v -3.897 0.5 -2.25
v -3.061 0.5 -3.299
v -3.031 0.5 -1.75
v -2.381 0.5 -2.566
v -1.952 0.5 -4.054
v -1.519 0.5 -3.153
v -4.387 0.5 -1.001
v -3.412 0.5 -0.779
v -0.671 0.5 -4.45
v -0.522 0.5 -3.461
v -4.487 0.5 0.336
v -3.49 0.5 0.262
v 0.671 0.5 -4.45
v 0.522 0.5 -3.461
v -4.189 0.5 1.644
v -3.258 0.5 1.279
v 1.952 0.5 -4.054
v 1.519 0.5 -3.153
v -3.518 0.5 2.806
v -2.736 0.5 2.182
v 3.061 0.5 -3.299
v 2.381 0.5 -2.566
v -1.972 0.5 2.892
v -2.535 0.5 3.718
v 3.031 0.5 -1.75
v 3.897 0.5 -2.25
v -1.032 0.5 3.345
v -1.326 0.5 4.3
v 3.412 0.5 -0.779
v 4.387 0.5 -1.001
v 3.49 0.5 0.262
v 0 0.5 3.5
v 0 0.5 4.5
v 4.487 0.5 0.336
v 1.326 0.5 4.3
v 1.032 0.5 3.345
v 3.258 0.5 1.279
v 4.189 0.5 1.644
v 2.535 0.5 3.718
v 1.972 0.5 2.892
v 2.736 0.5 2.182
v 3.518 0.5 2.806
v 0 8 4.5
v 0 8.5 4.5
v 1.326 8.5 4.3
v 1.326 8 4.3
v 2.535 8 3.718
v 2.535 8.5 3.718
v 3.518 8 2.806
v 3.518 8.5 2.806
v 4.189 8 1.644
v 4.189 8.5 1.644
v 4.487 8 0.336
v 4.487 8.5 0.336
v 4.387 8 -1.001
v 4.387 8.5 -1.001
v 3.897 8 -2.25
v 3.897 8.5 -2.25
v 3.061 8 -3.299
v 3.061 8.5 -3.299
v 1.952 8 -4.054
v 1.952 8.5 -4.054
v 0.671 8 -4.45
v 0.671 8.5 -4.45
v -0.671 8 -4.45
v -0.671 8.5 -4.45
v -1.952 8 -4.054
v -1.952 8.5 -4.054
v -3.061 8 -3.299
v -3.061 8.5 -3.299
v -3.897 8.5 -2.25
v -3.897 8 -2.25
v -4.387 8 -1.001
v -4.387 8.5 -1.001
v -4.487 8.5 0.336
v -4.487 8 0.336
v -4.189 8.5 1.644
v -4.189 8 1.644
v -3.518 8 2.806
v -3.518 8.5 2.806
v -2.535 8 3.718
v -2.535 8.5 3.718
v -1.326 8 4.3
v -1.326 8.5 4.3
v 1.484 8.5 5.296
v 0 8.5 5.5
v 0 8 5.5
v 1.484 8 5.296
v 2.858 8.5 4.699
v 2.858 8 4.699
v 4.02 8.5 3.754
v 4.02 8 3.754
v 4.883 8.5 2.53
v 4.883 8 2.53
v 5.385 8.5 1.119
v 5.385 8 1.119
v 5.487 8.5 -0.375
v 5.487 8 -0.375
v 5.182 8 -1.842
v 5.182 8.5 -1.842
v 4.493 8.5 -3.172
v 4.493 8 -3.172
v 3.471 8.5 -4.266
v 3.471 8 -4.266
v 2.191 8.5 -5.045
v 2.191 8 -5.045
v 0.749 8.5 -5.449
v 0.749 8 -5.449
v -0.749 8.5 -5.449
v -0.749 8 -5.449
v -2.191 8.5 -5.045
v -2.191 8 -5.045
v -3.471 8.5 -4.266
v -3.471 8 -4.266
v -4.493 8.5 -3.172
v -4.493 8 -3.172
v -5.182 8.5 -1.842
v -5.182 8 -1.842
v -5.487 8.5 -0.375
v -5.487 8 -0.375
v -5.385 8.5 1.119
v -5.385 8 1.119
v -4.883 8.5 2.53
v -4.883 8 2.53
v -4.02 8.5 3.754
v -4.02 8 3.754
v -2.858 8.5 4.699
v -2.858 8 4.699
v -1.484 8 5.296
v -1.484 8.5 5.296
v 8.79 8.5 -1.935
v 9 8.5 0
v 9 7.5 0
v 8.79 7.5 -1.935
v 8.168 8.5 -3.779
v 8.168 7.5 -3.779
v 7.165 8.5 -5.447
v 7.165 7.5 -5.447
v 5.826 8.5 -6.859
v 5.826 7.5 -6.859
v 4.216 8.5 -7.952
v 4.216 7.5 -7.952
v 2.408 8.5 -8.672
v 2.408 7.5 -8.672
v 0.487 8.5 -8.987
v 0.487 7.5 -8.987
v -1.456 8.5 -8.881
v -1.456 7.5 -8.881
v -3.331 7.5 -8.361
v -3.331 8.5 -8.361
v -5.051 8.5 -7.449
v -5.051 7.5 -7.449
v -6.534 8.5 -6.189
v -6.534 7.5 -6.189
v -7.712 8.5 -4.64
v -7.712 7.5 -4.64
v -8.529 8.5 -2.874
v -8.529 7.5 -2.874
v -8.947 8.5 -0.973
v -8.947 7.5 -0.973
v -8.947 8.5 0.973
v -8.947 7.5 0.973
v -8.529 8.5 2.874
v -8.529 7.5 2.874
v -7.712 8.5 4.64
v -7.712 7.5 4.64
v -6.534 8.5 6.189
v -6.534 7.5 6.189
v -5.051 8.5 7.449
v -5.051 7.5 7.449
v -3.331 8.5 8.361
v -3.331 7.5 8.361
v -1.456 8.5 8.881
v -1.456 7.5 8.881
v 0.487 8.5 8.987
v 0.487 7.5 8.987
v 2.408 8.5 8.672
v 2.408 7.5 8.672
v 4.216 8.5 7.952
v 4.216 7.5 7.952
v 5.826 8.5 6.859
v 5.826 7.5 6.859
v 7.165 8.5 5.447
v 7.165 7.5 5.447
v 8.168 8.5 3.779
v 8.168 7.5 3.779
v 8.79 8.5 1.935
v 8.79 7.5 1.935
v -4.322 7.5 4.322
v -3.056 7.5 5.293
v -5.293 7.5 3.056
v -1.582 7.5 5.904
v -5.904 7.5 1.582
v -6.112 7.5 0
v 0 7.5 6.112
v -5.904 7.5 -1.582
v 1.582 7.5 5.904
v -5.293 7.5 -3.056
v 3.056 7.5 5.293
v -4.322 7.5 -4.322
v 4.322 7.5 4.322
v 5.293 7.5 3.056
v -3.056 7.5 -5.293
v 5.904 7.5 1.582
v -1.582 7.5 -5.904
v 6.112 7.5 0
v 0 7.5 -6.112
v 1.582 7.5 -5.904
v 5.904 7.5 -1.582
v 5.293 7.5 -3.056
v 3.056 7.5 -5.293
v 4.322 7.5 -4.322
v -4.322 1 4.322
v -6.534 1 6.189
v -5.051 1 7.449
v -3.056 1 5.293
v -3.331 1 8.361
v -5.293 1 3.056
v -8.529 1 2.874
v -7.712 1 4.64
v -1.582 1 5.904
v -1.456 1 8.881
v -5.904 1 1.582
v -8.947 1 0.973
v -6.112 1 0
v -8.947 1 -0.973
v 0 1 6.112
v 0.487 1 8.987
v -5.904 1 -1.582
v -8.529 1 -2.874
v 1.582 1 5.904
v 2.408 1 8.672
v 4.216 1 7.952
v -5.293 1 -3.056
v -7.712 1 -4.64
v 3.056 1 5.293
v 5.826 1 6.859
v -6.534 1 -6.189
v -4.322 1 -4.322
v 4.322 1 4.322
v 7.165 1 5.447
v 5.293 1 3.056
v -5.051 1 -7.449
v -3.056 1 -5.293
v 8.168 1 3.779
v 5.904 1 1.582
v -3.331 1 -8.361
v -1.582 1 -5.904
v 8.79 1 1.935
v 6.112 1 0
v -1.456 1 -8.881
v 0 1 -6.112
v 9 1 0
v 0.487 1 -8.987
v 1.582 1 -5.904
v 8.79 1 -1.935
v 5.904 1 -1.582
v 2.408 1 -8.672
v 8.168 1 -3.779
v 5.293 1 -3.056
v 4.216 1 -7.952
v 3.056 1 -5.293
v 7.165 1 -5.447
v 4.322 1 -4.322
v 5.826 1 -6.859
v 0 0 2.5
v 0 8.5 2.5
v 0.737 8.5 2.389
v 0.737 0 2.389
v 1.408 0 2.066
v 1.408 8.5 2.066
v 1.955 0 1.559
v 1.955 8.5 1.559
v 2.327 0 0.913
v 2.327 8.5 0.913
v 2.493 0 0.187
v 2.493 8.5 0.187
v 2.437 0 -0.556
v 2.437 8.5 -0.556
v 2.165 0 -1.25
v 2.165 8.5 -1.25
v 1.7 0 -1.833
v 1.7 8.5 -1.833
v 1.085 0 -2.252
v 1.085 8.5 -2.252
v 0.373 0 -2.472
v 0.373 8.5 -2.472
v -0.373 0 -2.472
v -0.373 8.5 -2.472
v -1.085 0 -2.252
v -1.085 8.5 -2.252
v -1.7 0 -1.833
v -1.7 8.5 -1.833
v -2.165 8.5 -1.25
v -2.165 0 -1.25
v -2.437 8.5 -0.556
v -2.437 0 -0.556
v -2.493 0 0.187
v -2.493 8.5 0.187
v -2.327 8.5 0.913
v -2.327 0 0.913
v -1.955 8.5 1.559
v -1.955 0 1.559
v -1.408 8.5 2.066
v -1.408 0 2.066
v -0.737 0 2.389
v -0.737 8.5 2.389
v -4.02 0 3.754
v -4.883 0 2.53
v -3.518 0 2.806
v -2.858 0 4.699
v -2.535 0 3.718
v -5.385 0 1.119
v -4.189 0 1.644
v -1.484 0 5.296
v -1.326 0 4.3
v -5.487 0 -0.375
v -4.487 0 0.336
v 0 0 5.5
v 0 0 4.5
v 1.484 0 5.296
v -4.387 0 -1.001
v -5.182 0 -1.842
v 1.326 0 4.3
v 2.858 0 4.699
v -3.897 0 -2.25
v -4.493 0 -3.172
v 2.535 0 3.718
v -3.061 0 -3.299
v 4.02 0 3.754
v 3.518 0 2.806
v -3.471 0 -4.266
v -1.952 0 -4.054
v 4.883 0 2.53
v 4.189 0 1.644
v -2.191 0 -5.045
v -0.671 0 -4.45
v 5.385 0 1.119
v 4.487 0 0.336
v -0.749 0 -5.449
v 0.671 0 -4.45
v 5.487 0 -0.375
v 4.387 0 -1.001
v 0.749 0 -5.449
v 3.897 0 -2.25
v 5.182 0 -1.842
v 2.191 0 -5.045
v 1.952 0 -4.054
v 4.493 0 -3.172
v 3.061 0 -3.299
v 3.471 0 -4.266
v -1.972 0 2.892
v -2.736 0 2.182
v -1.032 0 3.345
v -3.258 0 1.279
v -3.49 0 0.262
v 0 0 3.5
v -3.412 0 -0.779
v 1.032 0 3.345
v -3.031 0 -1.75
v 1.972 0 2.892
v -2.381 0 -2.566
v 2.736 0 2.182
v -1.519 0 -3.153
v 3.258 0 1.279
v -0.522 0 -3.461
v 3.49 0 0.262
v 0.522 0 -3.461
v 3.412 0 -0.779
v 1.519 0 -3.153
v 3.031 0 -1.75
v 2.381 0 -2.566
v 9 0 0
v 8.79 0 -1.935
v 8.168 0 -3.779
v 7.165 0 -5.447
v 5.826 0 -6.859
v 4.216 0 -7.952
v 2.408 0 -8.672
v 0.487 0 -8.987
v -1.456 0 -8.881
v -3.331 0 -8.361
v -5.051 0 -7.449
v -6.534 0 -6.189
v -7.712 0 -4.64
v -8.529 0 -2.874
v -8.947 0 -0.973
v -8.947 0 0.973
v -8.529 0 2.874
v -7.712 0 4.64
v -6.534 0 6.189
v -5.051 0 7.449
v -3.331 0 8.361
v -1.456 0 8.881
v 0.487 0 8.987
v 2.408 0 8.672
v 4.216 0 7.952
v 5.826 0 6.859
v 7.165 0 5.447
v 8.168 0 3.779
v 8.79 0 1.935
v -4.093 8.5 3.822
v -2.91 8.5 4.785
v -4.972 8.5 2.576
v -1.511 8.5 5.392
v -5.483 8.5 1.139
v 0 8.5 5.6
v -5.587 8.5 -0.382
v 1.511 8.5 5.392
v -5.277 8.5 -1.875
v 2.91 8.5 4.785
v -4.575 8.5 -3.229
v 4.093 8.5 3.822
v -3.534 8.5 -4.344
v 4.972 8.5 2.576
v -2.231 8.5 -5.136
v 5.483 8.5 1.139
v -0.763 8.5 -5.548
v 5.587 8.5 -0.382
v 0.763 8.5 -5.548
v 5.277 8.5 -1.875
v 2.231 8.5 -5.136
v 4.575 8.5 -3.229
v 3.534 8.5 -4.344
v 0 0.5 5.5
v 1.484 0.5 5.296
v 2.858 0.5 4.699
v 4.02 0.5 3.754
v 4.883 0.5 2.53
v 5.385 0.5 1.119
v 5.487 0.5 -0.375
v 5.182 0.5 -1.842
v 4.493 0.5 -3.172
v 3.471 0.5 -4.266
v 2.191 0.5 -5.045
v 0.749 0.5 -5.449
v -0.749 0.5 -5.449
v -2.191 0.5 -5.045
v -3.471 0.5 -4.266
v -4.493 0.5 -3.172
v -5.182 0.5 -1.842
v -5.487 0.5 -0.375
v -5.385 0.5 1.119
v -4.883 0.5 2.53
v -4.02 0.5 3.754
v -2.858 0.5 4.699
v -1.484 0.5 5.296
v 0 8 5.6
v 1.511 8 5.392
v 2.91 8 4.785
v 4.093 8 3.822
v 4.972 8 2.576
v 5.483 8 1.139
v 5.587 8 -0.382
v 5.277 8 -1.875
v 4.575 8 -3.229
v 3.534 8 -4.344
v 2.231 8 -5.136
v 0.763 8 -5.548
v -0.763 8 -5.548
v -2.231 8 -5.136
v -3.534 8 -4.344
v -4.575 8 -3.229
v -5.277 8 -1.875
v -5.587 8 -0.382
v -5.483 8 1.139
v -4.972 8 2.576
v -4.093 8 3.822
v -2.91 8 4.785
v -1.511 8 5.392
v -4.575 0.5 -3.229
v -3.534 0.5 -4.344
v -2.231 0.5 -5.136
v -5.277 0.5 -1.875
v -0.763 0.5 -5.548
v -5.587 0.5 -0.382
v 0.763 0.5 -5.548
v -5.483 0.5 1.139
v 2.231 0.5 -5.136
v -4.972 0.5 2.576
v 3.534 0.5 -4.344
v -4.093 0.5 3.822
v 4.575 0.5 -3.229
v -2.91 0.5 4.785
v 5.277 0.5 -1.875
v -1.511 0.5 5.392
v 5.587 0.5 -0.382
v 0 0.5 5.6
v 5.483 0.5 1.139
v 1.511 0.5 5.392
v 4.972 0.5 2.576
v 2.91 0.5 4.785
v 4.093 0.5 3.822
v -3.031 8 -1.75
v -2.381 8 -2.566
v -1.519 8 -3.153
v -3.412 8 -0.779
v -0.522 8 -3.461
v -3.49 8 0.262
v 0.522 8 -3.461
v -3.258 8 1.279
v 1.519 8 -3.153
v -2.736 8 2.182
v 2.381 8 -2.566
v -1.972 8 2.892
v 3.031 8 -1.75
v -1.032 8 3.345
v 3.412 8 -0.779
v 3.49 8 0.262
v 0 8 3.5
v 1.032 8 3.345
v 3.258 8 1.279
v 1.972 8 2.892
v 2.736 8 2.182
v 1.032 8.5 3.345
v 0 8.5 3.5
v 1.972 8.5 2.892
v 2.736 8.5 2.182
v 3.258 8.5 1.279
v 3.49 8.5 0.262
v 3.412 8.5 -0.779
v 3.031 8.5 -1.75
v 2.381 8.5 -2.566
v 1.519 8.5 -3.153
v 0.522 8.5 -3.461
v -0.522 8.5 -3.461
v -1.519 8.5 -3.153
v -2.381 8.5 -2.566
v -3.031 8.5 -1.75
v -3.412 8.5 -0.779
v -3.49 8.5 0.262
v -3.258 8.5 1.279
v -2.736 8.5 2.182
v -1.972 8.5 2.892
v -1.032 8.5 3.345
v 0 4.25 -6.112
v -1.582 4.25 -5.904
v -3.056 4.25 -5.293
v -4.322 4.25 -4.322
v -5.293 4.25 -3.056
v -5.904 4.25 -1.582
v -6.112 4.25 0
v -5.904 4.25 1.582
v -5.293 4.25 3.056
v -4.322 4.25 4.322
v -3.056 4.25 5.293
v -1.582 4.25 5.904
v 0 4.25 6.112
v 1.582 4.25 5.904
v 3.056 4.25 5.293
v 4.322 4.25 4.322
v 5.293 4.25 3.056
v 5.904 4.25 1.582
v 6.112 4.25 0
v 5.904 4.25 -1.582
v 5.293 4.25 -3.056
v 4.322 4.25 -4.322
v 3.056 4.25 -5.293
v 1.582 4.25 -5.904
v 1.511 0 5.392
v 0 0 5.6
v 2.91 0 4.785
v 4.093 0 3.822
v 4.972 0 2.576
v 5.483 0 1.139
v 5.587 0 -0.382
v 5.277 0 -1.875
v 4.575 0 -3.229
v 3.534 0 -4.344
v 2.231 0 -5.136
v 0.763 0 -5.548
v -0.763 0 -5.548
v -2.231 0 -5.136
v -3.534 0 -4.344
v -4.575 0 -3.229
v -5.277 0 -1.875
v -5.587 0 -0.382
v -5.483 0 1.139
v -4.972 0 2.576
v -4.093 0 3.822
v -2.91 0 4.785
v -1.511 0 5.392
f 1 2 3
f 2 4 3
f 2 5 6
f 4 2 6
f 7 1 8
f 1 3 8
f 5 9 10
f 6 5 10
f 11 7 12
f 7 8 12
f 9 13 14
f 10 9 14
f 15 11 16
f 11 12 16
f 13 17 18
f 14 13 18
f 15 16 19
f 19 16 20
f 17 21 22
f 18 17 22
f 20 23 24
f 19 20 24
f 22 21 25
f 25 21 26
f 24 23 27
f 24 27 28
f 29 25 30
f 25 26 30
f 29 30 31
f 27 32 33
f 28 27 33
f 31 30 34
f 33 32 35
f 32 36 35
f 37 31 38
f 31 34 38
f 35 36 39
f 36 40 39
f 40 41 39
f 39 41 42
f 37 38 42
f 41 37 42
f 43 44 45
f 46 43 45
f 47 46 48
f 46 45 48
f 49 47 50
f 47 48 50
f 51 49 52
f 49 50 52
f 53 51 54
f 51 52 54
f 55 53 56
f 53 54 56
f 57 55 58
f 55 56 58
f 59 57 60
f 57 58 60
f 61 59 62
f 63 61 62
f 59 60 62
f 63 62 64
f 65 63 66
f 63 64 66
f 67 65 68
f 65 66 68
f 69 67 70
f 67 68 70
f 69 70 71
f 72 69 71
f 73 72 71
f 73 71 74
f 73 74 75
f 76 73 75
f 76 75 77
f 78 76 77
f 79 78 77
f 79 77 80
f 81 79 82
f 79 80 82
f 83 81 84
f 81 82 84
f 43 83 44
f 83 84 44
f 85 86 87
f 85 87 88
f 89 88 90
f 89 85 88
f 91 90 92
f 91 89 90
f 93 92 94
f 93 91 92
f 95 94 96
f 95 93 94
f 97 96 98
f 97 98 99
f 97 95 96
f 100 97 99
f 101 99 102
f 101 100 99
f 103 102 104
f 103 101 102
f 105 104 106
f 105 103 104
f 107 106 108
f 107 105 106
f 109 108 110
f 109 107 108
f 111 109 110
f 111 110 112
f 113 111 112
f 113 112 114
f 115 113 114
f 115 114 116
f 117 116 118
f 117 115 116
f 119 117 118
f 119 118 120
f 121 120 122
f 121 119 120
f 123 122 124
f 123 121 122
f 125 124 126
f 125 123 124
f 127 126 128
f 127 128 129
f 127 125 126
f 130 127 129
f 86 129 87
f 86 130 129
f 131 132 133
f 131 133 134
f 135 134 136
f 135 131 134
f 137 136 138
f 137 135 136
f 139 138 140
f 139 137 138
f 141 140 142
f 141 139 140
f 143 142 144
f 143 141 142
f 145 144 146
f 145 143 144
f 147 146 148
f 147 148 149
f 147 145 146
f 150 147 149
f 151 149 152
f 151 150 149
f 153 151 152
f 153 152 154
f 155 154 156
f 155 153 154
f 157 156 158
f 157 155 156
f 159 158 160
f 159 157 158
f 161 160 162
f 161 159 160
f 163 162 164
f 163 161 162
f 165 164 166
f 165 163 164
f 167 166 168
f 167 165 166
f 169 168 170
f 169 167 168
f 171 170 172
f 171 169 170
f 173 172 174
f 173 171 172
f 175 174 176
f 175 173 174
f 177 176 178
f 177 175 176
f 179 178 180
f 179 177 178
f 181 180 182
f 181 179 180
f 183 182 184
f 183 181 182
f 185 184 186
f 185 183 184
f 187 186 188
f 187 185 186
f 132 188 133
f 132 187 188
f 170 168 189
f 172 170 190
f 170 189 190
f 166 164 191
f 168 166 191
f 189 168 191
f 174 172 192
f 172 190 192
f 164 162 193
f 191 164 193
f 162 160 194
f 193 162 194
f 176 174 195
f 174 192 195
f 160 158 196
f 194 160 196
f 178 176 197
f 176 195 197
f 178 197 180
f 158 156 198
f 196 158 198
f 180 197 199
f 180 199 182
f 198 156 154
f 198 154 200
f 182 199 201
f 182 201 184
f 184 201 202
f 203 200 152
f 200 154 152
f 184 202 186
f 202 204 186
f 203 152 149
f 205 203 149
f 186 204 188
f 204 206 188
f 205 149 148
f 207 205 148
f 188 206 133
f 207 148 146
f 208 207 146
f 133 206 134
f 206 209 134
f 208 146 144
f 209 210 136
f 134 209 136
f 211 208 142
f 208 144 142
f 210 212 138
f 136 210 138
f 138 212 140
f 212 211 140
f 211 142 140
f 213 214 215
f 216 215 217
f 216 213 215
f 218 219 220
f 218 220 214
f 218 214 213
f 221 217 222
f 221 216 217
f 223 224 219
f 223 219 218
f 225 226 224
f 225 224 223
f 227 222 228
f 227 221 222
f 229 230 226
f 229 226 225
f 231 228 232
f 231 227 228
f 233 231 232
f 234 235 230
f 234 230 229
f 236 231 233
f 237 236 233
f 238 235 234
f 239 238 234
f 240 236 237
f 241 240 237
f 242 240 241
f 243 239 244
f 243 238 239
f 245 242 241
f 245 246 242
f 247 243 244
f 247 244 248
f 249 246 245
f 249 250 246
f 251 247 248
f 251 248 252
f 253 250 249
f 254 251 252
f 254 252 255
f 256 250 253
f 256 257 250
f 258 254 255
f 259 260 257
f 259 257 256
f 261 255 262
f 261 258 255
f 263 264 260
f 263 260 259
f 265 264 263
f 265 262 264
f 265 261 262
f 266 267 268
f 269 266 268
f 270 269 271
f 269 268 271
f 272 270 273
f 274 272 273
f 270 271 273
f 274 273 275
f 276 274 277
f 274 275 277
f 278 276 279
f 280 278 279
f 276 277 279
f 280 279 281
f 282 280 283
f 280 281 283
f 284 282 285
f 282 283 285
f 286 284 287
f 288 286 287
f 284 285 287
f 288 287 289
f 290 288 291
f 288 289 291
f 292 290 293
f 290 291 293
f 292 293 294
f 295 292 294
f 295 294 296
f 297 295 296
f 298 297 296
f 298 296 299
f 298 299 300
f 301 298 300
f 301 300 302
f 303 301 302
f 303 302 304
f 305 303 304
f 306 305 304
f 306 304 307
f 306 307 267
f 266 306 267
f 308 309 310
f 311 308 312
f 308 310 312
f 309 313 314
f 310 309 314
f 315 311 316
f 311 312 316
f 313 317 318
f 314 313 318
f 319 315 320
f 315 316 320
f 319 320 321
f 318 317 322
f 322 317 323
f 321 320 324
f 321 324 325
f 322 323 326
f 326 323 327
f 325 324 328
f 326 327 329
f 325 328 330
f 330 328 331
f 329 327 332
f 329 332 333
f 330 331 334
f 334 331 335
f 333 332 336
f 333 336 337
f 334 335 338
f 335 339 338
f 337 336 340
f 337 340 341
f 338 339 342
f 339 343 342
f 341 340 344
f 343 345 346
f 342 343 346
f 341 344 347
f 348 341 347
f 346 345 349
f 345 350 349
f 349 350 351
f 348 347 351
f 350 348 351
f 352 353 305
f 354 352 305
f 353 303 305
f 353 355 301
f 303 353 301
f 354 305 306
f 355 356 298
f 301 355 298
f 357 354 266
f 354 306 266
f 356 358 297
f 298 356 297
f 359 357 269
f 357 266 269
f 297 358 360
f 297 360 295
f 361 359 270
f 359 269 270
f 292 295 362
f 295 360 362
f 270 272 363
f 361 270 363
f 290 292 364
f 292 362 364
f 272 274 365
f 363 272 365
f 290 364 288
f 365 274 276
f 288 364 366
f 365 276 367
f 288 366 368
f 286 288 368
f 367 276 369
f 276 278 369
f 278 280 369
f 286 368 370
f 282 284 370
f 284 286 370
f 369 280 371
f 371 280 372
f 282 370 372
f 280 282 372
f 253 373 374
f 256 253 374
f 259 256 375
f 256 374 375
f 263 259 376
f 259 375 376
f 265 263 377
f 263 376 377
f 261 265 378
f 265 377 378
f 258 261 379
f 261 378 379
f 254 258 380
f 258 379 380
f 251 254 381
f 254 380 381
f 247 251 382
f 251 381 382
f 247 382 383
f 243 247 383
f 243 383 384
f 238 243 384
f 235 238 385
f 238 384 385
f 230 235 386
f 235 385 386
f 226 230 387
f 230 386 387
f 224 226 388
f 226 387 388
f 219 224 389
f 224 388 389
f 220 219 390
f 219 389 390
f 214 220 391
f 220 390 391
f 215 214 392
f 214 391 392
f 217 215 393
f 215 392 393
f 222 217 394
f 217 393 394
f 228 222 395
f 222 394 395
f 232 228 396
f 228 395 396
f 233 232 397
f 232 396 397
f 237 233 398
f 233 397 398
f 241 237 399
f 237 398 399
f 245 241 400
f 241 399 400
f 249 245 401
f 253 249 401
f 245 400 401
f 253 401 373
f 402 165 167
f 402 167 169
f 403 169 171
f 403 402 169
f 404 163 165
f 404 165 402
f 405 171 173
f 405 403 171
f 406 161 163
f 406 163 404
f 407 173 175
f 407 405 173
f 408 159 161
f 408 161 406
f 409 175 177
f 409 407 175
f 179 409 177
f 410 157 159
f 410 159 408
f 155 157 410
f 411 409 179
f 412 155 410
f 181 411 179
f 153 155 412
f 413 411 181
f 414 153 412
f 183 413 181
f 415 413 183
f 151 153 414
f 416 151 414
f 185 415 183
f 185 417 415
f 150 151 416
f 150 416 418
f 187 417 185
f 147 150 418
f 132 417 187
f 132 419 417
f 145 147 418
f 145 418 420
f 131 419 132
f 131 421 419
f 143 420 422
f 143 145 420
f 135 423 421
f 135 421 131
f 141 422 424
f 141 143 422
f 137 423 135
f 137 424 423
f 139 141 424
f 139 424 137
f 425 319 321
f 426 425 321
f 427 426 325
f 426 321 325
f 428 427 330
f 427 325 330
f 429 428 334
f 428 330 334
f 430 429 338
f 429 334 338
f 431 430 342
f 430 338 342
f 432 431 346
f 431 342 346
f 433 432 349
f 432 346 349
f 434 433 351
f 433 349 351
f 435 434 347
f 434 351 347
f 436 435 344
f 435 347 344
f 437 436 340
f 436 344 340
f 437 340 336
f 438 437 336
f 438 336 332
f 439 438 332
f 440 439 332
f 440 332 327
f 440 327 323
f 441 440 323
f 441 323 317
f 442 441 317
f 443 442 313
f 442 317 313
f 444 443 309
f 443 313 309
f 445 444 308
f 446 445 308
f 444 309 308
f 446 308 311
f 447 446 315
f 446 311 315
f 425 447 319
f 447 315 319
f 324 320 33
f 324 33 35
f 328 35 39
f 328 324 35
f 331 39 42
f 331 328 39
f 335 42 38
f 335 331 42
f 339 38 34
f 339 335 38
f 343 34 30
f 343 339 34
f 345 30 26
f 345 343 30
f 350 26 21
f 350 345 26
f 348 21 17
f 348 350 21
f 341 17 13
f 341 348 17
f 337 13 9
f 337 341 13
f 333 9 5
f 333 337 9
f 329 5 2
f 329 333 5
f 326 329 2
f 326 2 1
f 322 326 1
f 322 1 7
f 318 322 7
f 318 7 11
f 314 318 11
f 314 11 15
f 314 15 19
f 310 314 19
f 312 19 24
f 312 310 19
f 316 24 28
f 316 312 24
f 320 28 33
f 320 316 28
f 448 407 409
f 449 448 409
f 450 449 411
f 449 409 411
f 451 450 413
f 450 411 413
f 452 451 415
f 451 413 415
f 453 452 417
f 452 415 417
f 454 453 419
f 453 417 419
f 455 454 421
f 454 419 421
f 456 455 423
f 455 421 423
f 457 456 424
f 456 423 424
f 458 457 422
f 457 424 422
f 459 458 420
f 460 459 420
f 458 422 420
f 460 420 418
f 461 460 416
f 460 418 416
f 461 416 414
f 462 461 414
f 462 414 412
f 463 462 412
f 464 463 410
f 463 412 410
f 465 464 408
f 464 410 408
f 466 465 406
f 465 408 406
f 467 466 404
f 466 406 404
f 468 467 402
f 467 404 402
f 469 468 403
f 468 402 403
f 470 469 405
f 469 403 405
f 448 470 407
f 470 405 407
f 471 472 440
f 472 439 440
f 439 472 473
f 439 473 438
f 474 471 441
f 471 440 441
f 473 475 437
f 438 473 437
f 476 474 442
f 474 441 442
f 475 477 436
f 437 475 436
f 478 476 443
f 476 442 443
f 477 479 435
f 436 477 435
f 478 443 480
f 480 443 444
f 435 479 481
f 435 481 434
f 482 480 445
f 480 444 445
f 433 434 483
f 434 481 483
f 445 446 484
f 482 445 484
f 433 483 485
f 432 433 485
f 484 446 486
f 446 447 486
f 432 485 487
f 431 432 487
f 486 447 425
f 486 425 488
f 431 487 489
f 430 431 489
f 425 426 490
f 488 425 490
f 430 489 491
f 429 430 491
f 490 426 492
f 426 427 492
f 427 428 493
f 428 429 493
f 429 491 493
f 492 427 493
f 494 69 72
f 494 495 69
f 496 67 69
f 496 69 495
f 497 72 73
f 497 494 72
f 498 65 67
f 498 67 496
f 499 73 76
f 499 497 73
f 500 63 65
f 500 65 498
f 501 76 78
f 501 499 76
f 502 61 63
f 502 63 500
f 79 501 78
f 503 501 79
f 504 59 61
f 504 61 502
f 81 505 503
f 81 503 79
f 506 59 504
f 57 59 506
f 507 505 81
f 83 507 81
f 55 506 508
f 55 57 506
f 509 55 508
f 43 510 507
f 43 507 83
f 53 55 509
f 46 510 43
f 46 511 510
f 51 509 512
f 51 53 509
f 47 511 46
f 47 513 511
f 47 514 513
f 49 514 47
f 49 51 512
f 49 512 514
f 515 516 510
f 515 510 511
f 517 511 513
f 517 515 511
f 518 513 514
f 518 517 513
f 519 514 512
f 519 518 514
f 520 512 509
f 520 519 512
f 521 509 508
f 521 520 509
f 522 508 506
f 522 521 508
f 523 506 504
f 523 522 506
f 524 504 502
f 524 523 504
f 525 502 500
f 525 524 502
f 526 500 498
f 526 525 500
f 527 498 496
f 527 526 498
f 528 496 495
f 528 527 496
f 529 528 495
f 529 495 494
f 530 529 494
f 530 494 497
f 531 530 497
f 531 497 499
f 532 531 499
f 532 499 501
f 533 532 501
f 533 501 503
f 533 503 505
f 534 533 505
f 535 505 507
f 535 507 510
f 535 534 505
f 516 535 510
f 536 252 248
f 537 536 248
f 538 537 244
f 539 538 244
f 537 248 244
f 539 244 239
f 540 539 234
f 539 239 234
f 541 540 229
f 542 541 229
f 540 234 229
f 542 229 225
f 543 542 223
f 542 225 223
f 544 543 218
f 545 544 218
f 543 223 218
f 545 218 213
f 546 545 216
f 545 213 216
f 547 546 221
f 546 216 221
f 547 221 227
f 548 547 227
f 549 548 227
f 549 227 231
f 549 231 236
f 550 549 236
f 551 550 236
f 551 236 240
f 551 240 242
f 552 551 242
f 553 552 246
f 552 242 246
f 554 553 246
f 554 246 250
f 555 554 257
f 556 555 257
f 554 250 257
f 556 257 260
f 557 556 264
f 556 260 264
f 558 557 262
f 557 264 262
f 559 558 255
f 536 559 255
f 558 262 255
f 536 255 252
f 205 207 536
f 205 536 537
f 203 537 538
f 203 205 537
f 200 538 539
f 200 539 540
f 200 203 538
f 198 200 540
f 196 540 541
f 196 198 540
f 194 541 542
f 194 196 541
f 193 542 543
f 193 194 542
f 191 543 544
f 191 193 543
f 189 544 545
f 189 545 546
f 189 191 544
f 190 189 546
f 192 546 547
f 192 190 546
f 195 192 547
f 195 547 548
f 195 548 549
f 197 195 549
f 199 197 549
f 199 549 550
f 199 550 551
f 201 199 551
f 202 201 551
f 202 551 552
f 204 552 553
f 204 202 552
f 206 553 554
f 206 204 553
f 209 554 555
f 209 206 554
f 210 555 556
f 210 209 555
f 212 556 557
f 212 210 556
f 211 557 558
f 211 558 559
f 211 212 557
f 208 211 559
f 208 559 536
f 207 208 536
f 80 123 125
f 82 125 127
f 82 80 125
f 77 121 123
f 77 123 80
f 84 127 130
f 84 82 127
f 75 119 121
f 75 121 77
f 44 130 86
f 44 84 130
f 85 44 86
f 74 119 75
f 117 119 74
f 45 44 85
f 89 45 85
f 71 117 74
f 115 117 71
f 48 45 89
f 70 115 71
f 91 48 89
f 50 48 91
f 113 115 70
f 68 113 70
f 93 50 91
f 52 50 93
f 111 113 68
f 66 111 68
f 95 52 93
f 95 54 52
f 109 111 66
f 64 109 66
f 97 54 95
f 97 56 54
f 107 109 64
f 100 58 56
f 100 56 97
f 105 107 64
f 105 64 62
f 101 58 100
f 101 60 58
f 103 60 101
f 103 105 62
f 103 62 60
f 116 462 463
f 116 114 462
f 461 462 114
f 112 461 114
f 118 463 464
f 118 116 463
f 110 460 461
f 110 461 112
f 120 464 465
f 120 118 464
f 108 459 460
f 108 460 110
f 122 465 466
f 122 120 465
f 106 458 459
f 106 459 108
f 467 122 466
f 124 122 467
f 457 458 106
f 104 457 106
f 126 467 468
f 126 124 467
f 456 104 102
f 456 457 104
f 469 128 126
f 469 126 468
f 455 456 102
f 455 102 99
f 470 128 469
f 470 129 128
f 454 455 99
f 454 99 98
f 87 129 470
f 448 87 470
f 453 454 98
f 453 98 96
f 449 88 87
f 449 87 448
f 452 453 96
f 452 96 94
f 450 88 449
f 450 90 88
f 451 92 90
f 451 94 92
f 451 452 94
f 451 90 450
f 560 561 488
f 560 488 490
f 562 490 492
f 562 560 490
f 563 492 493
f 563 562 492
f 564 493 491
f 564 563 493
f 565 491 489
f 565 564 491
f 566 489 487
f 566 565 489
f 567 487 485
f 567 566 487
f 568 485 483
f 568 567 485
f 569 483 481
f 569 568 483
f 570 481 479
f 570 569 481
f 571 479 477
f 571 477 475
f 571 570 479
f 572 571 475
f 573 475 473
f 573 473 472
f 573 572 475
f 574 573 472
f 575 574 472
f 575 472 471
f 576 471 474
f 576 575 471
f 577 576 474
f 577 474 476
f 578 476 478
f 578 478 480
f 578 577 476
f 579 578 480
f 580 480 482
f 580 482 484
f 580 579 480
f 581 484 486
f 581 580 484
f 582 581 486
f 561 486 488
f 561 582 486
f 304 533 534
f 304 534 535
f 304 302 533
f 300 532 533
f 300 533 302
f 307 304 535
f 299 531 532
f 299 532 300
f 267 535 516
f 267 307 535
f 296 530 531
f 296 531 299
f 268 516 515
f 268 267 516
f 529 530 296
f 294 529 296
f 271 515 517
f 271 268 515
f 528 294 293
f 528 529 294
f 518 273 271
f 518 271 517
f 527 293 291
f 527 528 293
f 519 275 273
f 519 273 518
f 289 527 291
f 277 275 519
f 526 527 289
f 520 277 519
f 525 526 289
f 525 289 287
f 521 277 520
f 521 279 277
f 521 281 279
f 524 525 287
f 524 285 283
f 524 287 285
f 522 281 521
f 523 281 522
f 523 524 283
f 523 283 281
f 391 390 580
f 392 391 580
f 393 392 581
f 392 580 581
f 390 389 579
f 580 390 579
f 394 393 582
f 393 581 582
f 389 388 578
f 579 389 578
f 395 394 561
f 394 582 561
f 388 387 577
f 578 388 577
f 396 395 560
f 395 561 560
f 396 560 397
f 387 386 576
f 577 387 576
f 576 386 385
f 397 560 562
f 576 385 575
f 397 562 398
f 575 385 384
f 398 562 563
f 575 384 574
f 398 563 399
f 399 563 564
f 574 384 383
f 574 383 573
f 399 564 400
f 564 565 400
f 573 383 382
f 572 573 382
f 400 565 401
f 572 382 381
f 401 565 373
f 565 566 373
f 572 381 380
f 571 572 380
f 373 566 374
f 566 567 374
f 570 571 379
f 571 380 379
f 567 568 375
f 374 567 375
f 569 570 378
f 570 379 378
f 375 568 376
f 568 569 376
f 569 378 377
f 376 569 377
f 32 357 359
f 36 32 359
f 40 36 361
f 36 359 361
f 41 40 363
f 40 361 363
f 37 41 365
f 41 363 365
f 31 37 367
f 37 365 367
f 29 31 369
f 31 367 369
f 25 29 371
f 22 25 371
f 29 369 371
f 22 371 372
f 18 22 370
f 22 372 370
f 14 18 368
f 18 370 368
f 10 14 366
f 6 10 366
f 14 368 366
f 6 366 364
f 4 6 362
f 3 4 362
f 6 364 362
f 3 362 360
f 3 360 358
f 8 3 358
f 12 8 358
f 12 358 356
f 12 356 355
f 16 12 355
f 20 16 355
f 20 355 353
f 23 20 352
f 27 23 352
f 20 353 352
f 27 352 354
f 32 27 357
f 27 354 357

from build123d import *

# Parameters (mm, degrees)
BOSS_EXTRUDE1_OUTLINE_R = 9
BOSS_EXTRUDE1_DEPTH     = 1
SKETCH2_R               = 6.1121977
BOSS_EXTRUDE2_DEPTH     = 3.25
SKETCH3_R               = 2.5
CUT_EXTRUDE1_DEPTH      = 16.305227865
SKETCH4_R               = 5.6
SKETCH4_R_2             = 5.5
SKETCH4_R_3             = 4.5
SKETCH4_R_4             = 3.5
CUT_EXTRUDE2_DEPTH      = 0.5


# Read off the part's stored shape, not the designer's step: Boss-Extrude1
with BuildPart() as part:
    # Boss-Extrude1 outline → Boss-Extrude1 (new body)
    with BuildSketch(Plane(origin=(0, 0, 0), x_dir=(1, 0, 0), z_dir=(0, 1, 0))):
        Circle(BOSS_EXTRUDE1_OUTLINE_R)
    boss_extrude1 = extrude(amount=BOSS_EXTRUDE1_DEPTH)

    # Sketch2 → Boss-Extrude2 (add)
    with BuildSketch(Plane(origin=(0, 1, 0), x_dir=(1, 0, 0), z_dir=(0, 1, 0))):
        with Locations(Location((0, 0, 0), (0, 0, 90))):
            Circle(SKETCH2_R)
    boss_extrude2 = extrude(amount=BOSS_EXTRUDE2_DEPTH)

    # Mirror1: Boss-Extrude2 across plane
    add(boss_extrude2.mirror(Plane.ZX.offset(4.25)))

    # Mirror2: Boss-Extrude1 across plane
    add(boss_extrude1.mirror(Plane.ZX.offset(4.25)))

    # Sketch3 → Cut-Extrude1 (cut, through all)
    with BuildSketch(Plane(origin=(0, 8.5, 0), x_dir=(1, 0, 0), z_dir=(0, 1, 0))):
        with Locations(Location((0, 0, 0), (0, 0, 270))):
            Circle(SKETCH3_R)
    extrude(amount=-CUT_EXTRUDE1_DEPTH, mode=Mode.SUBTRACT)

    # Sketch4 → Cut-Extrude2 (cut)
    # profile 1 of 2: a face of its own
    with BuildSketch(Plane(origin=(0, 8.5, 0), x_dir=(1, 0, 0), z_dir=(0, 1, 0))):
        with Locations(Location((0, 0, 0), (0, 0, 270))):
            Circle(SKETCH4_R)
        with Locations(Location((0, 0, 0), (0, 0, 270))):
            Circle(SKETCH4_R_2, mode=Mode.SUBTRACT)
    # profile 2 of 2: a face of its own
    with BuildSketch(Plane(origin=(0, 8.5, 0), x_dir=(1, 0, 0), z_dir=(0, 1, 0))):
        with Locations(Location((0, 0, 0), (0, 0, 270))):
            Circle(SKETCH4_R_3)
        with Locations(Location((0, 0, 0), (0, 0, 270))):
            Circle(SKETCH4_R_4, mode=Mode.SUBTRACT)
    cut_extrude2 = extrude(amount=-CUT_EXTRUDE2_DEPTH, mode=Mode.SUBTRACT)

    # Mirror3: Cut-Extrude2 across plane
    add(cut_extrude2.mirror(Plane.ZX.offset(4.25)), mode=Mode.SUBTRACT)


solid = part.part
